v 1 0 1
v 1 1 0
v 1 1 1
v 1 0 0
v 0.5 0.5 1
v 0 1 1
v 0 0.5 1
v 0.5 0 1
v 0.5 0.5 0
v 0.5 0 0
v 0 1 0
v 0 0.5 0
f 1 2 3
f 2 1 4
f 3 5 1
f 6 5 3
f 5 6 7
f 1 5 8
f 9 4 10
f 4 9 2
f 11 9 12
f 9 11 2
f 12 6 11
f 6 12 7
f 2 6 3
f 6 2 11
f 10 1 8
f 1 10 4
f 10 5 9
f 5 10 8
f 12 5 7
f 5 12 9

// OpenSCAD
difference() {
    cube([1,1,1]);
    cube([.5,.5,1]);
    //%translate([-.1,-.1,-.1]) cube([.7,.7,1.2]);
}
